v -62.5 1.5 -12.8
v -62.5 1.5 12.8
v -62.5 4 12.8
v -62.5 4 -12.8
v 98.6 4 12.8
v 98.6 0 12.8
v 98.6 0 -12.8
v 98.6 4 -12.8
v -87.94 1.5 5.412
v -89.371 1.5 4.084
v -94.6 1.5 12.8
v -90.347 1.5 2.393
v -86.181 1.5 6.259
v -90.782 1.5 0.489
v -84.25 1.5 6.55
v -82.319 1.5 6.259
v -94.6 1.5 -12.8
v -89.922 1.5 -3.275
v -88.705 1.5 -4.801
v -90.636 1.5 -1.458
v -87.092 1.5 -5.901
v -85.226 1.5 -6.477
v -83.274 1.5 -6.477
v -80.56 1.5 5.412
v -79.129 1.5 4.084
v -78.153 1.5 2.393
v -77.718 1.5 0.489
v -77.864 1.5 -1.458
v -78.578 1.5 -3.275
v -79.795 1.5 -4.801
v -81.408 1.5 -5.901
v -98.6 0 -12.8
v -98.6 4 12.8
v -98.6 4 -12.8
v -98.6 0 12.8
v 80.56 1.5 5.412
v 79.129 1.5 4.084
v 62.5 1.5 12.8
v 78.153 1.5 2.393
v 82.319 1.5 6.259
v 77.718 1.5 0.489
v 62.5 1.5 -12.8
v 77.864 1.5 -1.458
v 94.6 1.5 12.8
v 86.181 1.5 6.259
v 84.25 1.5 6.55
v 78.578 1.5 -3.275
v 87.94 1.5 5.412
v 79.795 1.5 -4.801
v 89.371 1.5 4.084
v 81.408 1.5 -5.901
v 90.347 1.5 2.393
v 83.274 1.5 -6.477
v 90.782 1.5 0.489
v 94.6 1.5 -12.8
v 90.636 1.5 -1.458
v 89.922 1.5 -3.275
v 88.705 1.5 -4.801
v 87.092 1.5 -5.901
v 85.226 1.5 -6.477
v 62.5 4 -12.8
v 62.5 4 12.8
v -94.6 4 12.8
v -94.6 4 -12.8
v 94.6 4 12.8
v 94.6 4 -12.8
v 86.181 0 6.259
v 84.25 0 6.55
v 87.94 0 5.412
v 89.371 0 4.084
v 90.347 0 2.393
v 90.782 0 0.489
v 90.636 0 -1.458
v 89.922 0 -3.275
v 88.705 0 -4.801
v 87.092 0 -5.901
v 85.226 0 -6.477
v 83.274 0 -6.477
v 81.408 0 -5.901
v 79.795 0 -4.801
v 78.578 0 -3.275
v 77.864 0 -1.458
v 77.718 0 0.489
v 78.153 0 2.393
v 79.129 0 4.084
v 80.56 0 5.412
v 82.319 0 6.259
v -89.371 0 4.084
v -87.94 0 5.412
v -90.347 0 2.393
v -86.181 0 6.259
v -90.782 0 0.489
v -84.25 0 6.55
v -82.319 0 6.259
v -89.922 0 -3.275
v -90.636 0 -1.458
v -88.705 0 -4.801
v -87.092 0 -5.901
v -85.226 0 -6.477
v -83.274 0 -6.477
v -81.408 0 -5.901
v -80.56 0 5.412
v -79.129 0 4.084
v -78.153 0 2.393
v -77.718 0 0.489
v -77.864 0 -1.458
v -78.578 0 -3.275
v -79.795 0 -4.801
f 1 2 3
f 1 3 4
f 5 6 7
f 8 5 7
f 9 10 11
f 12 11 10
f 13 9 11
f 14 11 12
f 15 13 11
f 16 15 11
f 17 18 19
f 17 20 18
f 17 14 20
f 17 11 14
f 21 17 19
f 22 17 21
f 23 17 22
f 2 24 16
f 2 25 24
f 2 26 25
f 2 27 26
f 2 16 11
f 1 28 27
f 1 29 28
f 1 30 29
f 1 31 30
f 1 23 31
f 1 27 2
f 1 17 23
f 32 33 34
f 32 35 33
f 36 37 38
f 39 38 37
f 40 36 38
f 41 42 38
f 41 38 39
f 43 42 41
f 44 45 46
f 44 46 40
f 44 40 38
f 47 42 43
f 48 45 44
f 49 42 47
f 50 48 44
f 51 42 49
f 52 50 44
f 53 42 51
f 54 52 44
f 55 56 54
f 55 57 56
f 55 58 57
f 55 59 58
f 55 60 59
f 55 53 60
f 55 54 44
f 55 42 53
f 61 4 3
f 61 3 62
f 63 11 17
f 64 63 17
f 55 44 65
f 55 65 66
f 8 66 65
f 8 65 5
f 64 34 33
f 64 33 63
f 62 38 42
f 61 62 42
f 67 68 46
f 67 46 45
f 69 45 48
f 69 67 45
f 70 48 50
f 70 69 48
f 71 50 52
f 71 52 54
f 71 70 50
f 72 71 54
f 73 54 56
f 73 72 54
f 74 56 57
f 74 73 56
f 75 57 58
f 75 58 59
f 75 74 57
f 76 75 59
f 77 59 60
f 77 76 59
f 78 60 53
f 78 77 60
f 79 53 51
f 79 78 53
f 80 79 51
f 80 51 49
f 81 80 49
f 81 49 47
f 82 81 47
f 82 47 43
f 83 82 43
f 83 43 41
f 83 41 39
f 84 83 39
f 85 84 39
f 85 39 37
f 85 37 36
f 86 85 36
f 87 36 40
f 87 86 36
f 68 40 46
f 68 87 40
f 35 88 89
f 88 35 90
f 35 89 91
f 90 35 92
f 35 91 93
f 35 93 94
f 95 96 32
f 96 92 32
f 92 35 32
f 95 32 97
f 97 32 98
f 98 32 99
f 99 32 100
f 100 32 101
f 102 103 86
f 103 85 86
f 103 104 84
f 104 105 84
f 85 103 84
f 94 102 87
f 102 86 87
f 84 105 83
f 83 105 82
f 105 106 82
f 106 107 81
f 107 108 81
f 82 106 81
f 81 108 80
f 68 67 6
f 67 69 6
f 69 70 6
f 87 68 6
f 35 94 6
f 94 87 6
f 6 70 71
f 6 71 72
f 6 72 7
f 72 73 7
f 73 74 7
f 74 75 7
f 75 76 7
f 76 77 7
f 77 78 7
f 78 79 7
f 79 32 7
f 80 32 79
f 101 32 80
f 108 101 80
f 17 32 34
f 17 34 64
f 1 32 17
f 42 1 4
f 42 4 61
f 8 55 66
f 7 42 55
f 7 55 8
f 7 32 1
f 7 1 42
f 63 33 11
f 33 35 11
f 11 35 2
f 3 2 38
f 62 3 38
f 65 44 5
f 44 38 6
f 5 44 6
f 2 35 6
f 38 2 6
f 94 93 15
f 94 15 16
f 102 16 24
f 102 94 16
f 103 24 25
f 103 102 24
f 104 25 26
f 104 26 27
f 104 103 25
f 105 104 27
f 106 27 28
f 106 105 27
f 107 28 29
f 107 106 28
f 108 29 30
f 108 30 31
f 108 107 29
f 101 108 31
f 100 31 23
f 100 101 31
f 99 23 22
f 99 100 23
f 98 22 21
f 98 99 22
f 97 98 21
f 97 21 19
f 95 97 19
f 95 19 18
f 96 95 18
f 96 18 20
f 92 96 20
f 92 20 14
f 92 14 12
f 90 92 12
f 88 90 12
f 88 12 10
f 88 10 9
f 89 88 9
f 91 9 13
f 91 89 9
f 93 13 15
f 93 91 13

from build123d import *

# Parameters (mm, degrees)
SKETCH1_W           = 197.2
SKETCH1_H           = 25.6
SKETCH1_R           = 6.55
BOSS_EXTRUDE1_DEPTH = 1.5
SKETCH3_W           = 125
SKETCH3_H           = 25.6
SKETCH3_W_2         = 4
BOSS_EXTRUDE3_DEPTH = 2.5


with BuildPart() as part:
    # Sketch1 → Boss-Extrude1 (new body)
    with BuildSketch(Plane(origin=(0, 0, 0), x_dir=(1, 0, 0), z_dir=(0, 1, 0))):
        Rectangle(SKETCH1_W, SKETCH1_H)
        with Locations(Location((-84.25, 0, 0), (0, 0, 270))):
            Circle(SKETCH1_R, mode=Mode.SUBTRACT)
        with Locations(Location((84.25, 0, 0), (0, 0, 270))):
            Circle(SKETCH1_R, mode=Mode.SUBTRACT)
    extrude(amount=BOSS_EXTRUDE1_DEPTH)

    # Sketch3 → Boss-Extrude3 (add)
    with BuildSketch(Plane(origin=(0, 1.5, 0), x_dir=(1, 0, 0), z_dir=(0, 1, 0))):
        Rectangle(SKETCH3_W, SKETCH3_H)
        with Locations((-96.6, 0)):
            Rectangle(SKETCH3_W_2, SKETCH3_H)
        with Locations((96.6, 0)):
            Rectangle(SKETCH3_W_2, SKETCH3_H)
    extrude(amount=BOSS_EXTRUDE3_DEPTH)


solid = part.part
